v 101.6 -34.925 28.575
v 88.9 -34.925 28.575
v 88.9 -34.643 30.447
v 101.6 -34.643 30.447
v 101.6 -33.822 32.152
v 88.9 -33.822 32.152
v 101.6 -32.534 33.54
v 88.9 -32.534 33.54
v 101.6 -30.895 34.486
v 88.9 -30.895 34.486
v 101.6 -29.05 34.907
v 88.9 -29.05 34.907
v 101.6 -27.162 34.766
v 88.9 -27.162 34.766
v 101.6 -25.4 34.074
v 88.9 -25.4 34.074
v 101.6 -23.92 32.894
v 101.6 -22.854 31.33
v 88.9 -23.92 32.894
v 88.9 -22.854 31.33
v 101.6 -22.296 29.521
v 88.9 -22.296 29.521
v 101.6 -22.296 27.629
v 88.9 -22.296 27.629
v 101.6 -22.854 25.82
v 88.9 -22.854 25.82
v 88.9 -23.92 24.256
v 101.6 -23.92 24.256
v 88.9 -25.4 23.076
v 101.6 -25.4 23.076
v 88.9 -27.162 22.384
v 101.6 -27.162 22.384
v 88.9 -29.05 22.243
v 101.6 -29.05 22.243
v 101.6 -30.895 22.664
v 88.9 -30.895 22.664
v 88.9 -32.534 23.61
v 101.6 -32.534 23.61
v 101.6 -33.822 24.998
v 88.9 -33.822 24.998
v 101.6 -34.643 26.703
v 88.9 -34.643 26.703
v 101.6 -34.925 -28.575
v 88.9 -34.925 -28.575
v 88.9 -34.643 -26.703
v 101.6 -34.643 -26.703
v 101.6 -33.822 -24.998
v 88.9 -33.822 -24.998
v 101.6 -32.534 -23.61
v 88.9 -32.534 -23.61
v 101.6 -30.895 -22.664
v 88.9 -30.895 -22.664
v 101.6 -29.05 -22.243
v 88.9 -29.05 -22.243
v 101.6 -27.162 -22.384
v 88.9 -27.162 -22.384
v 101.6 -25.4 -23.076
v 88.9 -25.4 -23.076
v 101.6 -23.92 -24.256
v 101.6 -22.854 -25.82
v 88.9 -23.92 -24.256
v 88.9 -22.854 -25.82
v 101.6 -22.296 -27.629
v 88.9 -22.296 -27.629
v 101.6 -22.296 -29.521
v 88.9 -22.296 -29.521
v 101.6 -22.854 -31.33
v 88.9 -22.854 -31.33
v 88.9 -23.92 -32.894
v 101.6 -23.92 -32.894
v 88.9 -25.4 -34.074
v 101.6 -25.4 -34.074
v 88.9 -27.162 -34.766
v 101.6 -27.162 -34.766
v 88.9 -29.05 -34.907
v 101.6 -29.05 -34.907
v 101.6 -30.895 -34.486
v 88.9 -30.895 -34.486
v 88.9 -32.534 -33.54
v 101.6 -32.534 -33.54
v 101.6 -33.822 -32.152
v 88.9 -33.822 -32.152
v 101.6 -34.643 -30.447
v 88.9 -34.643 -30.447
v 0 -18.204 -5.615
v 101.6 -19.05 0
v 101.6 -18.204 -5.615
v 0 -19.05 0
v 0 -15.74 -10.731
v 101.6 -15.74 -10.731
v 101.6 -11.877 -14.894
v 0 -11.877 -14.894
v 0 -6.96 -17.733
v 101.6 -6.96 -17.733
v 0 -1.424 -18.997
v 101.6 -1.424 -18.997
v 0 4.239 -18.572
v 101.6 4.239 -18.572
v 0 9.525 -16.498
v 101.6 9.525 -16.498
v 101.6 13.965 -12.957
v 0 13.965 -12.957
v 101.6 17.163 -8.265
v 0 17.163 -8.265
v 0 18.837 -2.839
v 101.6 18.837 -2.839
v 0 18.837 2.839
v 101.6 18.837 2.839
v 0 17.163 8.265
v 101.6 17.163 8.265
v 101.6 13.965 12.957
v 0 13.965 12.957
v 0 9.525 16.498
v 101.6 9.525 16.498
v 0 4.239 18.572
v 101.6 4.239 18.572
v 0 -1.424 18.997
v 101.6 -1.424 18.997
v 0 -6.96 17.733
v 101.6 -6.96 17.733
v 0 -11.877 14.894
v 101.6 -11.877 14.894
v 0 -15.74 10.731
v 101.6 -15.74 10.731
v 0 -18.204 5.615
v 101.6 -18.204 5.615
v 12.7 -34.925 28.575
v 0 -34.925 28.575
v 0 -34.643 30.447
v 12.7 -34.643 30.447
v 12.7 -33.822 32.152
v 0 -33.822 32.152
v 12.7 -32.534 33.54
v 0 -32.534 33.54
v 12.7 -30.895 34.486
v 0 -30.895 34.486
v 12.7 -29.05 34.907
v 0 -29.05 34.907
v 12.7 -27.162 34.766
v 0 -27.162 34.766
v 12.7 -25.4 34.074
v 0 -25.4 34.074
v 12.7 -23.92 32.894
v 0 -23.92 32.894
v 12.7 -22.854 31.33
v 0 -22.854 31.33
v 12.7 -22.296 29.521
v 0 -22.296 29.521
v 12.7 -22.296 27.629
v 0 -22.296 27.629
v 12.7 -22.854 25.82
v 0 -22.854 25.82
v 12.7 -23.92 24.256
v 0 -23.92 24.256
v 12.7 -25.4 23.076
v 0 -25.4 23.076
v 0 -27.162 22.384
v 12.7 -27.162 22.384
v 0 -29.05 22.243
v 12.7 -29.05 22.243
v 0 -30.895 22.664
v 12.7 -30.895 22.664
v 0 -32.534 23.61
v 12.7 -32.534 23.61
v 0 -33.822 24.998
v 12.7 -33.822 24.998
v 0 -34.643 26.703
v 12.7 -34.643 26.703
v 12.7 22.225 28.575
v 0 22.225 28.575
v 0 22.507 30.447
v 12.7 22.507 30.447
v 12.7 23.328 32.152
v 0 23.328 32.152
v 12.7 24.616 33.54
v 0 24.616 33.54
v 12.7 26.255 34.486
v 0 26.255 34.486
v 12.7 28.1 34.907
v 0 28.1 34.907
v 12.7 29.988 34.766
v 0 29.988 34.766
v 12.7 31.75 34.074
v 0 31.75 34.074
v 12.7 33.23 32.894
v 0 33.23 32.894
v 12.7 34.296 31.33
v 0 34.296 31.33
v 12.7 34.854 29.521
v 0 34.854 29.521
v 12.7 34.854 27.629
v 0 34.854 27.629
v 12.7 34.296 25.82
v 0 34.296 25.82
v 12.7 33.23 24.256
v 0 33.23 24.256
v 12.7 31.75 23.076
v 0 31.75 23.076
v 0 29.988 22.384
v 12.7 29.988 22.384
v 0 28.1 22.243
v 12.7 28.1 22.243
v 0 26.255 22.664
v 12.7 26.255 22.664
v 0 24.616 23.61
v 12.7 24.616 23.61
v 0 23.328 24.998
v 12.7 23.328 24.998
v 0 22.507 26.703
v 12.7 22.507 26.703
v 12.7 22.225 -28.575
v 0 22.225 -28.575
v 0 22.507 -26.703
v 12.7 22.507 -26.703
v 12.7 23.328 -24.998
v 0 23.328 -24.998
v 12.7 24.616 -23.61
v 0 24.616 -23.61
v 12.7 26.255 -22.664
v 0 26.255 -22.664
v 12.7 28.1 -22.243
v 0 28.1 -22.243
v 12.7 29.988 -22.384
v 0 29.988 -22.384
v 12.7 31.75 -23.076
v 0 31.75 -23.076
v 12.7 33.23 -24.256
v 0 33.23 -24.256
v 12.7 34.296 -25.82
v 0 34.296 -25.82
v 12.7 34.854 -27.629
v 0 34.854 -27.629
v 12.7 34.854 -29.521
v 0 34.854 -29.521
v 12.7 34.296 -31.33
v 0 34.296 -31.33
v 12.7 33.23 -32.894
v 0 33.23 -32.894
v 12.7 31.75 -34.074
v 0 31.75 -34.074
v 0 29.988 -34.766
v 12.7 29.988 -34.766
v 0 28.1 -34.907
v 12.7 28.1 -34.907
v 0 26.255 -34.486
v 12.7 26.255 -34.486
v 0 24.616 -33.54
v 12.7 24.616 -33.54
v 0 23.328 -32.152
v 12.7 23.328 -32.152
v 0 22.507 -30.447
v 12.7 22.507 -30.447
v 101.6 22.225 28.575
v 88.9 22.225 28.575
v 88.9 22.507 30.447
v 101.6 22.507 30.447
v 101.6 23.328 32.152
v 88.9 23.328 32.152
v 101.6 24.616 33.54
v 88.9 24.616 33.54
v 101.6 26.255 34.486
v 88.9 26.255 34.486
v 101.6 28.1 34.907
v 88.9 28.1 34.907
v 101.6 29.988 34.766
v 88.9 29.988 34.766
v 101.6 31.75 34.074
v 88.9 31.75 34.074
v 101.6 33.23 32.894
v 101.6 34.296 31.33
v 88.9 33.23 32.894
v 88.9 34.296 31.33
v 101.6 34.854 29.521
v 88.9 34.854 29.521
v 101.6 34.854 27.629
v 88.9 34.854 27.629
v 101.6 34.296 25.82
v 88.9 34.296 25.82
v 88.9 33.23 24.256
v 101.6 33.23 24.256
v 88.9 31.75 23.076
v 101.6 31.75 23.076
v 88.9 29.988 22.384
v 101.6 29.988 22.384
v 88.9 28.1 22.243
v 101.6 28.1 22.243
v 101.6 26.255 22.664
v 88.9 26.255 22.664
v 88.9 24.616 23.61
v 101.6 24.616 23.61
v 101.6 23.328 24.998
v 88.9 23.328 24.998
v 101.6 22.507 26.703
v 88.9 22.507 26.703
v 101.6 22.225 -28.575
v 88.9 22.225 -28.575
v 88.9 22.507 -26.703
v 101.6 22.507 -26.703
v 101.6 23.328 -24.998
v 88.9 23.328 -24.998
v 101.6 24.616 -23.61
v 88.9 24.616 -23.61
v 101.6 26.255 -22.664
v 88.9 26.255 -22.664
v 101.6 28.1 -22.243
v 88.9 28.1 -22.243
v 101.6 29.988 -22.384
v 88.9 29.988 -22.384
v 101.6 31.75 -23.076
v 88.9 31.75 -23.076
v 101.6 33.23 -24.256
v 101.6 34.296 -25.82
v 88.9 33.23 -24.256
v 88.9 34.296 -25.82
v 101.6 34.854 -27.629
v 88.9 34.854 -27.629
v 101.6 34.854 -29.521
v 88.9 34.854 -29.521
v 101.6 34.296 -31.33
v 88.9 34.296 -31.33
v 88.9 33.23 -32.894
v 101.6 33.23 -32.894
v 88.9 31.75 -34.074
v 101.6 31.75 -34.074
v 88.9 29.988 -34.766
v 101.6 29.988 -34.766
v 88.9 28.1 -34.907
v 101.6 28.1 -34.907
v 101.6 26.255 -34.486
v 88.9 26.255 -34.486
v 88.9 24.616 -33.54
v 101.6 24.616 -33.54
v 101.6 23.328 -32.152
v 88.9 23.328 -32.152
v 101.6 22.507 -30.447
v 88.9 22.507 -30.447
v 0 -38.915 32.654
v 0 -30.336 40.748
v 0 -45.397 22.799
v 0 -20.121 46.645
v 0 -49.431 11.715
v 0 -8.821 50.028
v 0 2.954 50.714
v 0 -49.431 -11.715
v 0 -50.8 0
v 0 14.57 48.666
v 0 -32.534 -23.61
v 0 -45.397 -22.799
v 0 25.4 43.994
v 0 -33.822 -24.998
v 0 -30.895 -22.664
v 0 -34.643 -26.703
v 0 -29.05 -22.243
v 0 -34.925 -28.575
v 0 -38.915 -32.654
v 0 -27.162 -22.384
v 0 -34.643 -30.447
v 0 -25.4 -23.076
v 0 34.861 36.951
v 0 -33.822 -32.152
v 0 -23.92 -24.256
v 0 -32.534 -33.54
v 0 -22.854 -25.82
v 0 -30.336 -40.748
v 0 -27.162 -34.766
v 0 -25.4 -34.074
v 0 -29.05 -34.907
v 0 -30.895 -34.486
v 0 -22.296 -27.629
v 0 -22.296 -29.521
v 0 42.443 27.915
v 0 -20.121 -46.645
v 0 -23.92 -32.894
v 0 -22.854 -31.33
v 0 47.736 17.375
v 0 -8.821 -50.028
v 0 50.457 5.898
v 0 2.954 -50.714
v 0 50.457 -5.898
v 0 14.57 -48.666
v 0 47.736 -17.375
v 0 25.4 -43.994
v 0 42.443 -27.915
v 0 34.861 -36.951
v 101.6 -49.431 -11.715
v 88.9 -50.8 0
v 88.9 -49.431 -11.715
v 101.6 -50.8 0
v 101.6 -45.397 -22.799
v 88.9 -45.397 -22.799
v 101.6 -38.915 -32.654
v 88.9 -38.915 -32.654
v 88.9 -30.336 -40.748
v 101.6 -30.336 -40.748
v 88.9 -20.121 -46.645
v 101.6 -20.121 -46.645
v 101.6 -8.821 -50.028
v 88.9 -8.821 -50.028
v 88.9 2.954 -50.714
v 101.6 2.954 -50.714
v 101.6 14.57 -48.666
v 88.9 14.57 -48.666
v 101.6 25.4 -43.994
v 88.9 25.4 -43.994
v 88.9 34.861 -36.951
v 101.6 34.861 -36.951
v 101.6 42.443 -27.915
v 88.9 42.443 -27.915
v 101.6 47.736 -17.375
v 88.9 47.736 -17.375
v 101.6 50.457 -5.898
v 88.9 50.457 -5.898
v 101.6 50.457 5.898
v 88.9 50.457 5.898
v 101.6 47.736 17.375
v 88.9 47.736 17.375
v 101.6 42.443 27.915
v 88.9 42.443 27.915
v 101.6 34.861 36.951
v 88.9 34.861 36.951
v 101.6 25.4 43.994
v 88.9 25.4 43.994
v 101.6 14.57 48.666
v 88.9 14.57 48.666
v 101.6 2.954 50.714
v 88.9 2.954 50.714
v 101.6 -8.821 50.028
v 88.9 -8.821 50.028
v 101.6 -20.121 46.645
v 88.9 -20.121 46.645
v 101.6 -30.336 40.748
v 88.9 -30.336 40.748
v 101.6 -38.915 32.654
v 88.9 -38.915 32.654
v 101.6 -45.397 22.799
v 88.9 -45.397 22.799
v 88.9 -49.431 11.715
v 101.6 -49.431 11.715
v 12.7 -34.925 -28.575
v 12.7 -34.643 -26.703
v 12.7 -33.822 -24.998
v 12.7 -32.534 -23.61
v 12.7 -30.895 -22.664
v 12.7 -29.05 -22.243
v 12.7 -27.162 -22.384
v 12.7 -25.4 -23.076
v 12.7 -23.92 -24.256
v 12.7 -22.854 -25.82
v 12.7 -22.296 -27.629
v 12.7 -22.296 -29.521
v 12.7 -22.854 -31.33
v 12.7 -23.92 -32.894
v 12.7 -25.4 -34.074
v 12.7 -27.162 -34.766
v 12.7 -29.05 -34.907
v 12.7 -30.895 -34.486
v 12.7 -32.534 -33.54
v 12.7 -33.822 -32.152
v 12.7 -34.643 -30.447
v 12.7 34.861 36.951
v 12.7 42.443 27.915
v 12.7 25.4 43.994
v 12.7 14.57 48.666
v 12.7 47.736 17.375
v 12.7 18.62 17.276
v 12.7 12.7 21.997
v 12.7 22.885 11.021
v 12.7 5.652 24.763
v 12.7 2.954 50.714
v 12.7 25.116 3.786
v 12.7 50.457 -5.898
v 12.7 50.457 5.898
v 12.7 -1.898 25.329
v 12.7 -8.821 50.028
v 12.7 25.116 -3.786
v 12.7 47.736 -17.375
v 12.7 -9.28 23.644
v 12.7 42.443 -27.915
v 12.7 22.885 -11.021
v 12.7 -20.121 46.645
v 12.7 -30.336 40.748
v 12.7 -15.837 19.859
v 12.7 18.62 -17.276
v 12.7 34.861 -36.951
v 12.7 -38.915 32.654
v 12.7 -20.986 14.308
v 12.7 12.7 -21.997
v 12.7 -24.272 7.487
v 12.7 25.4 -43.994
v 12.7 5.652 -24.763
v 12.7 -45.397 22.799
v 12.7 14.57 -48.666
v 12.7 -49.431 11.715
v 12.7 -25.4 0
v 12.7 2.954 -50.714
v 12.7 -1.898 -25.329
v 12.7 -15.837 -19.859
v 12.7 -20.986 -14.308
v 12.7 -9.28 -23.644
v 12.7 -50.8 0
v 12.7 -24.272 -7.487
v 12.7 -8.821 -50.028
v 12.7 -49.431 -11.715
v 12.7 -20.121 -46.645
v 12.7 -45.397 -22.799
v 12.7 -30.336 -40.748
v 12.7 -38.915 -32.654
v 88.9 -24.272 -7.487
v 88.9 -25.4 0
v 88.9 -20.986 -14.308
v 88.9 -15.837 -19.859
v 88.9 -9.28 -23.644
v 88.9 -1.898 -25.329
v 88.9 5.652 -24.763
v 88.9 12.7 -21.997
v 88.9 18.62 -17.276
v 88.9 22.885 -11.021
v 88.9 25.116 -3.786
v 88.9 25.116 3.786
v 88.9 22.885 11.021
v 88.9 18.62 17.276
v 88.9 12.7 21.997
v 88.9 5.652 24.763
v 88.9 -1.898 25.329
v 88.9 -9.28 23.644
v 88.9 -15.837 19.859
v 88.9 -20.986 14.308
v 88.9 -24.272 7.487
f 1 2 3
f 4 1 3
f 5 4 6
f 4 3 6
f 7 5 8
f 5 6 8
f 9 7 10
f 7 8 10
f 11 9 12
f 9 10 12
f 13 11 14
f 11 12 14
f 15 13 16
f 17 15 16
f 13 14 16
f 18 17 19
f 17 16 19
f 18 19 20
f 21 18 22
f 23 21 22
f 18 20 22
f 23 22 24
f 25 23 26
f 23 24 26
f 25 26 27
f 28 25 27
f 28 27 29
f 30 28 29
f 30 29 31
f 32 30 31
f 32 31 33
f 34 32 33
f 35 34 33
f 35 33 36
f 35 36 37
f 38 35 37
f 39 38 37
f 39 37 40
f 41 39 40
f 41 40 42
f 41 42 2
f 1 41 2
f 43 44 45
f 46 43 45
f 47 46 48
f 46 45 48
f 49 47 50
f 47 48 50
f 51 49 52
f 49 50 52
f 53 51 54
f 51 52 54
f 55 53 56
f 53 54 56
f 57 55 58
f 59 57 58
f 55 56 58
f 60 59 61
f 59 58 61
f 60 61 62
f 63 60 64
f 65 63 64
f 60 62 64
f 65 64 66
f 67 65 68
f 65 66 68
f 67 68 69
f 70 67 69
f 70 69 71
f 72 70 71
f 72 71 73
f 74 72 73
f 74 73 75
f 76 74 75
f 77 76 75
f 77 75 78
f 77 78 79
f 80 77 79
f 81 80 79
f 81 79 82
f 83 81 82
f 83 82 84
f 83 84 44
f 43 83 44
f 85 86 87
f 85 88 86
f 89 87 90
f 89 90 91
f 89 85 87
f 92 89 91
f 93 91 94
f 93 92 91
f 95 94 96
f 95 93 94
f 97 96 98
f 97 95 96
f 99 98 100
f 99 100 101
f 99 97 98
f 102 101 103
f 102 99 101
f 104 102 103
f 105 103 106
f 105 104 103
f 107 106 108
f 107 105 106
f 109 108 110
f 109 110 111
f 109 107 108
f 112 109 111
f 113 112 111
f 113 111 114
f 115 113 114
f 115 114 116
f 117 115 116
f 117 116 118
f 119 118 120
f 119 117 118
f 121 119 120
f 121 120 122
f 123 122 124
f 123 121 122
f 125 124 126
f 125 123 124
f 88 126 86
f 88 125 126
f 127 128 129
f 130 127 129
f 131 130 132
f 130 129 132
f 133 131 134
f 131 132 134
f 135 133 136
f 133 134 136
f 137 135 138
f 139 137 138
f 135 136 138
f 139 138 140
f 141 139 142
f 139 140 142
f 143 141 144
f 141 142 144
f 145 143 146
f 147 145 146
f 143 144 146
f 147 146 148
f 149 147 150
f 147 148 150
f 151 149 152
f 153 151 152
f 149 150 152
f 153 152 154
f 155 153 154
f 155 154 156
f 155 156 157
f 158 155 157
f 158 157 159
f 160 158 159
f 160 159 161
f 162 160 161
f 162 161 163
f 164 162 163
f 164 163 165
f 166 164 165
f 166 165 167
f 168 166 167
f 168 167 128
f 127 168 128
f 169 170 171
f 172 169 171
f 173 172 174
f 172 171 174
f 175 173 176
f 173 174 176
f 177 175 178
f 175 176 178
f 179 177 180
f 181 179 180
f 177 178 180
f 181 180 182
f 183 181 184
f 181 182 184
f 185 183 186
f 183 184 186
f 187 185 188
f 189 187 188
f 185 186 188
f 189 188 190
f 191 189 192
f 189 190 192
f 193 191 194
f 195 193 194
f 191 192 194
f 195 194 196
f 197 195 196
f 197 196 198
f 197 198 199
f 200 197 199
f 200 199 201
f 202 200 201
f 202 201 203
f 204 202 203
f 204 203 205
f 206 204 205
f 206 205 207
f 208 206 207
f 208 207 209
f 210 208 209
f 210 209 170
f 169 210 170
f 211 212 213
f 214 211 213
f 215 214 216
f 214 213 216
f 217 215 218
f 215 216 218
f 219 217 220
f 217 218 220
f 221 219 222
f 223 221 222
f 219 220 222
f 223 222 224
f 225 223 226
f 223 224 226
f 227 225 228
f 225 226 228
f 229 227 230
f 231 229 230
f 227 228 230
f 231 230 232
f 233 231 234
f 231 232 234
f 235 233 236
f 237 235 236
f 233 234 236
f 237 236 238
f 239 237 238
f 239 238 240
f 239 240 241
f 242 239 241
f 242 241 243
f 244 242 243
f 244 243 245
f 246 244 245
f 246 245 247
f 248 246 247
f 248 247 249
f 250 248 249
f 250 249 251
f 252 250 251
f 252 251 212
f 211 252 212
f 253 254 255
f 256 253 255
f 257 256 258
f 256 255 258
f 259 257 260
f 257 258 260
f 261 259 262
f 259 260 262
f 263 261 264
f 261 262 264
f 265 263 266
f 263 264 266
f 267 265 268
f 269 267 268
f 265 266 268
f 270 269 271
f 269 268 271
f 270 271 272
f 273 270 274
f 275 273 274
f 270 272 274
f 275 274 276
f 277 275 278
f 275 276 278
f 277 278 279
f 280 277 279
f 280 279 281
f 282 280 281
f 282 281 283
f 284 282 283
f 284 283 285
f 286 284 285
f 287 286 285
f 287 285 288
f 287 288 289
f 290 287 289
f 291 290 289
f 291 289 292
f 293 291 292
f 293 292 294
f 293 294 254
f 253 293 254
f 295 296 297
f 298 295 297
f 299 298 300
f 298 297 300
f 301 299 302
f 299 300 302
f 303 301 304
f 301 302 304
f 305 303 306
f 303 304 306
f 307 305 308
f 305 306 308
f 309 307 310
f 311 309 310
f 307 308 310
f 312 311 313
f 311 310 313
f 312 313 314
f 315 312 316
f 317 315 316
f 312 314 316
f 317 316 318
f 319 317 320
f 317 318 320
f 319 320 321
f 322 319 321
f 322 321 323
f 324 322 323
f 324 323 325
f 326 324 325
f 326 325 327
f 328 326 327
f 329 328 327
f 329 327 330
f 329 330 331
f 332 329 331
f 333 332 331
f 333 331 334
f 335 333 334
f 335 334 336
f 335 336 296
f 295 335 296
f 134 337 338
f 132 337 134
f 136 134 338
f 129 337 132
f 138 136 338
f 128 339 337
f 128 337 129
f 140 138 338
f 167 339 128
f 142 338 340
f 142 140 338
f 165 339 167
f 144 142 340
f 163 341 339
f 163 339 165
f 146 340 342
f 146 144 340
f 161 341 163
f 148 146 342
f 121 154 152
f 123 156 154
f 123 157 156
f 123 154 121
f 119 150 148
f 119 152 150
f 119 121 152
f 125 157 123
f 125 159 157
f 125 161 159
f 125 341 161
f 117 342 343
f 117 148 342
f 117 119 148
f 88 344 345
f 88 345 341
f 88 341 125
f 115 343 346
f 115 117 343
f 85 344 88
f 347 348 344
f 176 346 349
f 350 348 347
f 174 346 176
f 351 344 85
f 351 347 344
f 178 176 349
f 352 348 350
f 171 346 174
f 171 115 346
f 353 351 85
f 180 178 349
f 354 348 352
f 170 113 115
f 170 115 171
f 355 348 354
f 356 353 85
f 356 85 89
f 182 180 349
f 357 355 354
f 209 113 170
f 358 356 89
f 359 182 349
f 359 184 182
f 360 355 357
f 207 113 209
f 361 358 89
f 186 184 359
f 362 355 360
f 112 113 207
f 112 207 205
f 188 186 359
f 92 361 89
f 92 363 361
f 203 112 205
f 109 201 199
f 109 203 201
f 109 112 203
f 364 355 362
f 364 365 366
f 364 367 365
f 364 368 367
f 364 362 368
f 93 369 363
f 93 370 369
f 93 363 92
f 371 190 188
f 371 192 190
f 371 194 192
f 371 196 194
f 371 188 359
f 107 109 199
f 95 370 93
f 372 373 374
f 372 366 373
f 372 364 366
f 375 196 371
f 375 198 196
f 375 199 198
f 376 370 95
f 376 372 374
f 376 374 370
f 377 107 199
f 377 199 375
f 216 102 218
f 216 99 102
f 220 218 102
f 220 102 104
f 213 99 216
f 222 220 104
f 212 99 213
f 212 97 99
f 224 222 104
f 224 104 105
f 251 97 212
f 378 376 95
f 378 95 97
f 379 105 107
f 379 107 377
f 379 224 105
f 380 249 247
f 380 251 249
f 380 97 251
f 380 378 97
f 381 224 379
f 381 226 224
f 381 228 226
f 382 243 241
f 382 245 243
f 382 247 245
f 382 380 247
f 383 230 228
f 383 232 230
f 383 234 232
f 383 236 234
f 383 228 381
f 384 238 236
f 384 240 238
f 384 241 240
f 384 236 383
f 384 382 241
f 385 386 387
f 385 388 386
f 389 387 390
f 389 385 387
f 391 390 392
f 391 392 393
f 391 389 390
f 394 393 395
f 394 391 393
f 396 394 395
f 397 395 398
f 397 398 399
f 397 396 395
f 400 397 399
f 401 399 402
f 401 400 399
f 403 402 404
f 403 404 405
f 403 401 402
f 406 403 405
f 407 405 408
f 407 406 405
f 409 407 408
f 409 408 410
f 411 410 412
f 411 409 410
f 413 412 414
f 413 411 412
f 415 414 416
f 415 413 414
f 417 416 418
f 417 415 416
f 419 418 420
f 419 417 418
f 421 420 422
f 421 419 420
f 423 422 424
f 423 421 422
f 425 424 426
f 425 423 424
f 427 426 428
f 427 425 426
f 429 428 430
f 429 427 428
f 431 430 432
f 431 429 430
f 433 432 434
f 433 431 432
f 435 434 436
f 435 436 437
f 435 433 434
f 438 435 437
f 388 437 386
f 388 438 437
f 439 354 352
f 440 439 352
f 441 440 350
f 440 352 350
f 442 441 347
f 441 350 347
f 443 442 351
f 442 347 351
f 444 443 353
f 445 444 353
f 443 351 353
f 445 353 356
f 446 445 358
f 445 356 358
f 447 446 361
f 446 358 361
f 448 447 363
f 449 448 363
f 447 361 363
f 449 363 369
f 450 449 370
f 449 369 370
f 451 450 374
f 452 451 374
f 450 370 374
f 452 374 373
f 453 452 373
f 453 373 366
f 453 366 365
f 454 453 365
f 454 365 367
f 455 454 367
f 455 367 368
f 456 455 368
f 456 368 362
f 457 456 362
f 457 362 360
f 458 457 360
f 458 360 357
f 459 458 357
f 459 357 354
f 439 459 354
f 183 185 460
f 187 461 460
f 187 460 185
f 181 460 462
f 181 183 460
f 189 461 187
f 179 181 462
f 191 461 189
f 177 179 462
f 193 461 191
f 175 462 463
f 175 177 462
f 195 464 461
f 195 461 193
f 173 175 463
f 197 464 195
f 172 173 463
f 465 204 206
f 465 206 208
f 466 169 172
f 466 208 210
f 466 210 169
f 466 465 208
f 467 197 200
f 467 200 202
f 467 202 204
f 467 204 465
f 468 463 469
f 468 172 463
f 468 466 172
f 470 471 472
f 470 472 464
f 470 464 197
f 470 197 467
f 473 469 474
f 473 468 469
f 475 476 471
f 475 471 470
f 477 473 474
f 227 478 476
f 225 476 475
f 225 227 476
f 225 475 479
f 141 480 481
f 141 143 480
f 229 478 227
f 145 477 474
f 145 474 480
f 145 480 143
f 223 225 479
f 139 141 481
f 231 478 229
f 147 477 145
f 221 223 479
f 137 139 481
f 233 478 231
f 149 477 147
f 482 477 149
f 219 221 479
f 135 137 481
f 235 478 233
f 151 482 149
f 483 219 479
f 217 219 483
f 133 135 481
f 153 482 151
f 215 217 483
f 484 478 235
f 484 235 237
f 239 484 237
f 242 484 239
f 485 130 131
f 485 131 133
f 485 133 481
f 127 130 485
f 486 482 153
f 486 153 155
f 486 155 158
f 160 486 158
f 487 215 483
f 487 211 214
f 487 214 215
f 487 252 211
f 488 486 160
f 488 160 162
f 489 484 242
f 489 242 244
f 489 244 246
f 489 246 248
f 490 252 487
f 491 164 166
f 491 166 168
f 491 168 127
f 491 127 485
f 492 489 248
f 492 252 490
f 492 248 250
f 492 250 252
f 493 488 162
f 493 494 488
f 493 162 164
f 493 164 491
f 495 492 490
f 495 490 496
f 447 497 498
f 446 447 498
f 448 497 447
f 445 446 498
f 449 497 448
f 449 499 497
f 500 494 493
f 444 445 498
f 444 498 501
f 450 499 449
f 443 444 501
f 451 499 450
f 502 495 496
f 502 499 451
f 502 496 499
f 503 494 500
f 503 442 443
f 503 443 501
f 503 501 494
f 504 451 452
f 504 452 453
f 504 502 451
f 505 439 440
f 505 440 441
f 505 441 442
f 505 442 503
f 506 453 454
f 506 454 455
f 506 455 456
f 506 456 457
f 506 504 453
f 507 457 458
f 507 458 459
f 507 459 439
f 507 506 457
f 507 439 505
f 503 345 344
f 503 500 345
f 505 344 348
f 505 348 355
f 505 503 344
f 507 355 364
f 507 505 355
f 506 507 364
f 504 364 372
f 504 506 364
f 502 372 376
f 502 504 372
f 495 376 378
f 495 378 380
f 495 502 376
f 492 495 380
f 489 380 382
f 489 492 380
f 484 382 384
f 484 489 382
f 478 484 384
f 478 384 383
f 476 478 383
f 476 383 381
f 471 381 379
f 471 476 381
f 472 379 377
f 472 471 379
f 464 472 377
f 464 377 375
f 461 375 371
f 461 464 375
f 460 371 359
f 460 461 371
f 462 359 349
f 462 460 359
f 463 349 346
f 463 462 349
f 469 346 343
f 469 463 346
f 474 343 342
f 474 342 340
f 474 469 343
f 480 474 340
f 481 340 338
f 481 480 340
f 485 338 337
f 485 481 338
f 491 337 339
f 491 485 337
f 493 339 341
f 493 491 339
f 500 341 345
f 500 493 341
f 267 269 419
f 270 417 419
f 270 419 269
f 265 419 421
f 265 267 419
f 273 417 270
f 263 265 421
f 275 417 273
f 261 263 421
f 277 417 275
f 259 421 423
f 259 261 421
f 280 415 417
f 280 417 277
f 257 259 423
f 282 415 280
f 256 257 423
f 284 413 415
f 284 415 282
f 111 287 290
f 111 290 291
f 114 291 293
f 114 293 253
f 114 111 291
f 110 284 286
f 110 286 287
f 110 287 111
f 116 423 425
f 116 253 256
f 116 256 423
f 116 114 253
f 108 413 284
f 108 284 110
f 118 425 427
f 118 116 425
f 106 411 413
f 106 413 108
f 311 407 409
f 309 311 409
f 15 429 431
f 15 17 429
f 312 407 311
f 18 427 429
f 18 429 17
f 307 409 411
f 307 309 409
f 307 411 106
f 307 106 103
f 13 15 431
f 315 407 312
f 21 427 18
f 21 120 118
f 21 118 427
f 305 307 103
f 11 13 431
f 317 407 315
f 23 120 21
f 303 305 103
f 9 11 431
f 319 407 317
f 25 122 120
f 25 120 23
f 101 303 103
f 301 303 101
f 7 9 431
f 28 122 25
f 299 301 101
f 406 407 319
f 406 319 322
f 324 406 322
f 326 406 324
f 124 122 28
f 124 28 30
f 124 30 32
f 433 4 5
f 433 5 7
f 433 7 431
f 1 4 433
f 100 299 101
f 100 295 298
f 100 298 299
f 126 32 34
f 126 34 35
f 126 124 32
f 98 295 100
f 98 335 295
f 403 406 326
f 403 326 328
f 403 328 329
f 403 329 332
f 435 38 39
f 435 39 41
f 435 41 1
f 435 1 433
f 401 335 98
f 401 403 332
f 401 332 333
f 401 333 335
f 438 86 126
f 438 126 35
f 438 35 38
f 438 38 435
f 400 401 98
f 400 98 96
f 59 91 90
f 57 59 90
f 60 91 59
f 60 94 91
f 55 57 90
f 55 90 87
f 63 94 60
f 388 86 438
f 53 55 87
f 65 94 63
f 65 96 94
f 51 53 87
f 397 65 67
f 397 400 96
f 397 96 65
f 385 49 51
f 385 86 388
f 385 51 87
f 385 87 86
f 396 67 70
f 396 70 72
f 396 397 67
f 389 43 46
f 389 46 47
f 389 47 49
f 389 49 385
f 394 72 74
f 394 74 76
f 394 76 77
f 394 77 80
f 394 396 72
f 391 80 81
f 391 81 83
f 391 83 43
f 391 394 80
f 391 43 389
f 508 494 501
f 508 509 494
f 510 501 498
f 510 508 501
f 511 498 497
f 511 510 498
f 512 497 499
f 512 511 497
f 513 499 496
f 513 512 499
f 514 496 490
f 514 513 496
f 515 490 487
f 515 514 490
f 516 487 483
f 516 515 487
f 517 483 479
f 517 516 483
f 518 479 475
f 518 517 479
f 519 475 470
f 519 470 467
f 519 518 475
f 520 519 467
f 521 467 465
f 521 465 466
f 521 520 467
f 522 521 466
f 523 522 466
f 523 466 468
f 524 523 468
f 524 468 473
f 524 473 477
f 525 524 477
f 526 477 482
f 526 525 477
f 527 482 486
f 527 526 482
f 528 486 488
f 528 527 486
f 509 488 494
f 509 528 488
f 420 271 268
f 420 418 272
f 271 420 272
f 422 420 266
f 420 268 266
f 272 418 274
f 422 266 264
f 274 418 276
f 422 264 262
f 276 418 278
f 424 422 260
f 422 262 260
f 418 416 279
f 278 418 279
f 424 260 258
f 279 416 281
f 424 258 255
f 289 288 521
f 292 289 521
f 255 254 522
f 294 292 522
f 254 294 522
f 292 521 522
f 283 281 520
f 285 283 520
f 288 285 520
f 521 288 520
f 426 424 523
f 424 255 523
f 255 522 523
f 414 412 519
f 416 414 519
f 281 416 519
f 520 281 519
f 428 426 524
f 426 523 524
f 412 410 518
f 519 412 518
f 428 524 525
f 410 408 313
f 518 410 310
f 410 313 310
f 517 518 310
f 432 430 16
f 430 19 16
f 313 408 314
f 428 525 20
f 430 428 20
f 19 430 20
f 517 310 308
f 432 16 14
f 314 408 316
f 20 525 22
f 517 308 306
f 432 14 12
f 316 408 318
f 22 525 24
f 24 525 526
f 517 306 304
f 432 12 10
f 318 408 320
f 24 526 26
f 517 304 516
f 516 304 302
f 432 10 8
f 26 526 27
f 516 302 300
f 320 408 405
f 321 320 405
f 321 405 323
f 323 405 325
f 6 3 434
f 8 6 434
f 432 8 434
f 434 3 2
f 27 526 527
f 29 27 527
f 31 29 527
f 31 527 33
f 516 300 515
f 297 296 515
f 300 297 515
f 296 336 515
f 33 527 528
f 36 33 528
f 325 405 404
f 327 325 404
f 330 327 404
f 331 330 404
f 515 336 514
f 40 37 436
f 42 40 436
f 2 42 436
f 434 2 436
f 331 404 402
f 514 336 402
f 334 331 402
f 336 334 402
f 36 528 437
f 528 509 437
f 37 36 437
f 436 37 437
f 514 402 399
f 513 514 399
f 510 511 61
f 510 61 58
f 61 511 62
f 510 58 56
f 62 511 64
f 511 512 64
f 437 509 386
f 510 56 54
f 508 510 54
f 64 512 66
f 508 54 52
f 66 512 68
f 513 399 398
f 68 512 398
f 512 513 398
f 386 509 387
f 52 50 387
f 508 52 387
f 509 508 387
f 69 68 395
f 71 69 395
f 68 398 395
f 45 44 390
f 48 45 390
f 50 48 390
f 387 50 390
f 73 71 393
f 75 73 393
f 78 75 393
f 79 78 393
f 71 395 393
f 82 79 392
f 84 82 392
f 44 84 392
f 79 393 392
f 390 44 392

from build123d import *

# Parameters (mm, degrees)
F0_W     = 12.7
F0_H     = 6.35
F0_H_2   = 25.4
F0_W_2   = 76.2
F2_R     = 6.35
F3_DEPTH = 101.6


with BuildPart() as f1:
    # F0 (on Top) → F1 (revolve)
    with BuildSketch(Plane.XY):
        with Locations((6.35, -22.225)):
            Rectangle(F0_W, F0_H)
        with Locations((6.35, -38.1)):
            Rectangle(F0_W, F0_H_2)
        with Locations((50.8, -22.225)):
            Rectangle(F0_W_2, F0_H)
        with Locations((95.25, -22.225)):
            Rectangle(F0_W, F0_H)
        with Locations((95.25, -38.1)):
            Rectangle(F0_W, F0_H_2)
    revolve(axis=Axis((50.8, 0, 0), (1, 0, 0)))

    # F2 (on face) → F3 (cut, through all)
    with BuildSketch(Plane(origin=(0, 0, 0), x_dir=(0, -1, 0), z_dir=(-1, 0, 0))):
        with Locations((-28.575, 28.575)):
            Circle(F2_R)
        with Locations((28.575, 28.575)):
            Circle(F2_R)
        with Locations((-28.575, -28.575)):
            Circle(F2_R)
        with Locations((28.575, -28.575)):
            Circle(F2_R)
    extrude(amount=-F3_DEPTH, mode=Mode.SUBTRACT)


solid = f1.part
